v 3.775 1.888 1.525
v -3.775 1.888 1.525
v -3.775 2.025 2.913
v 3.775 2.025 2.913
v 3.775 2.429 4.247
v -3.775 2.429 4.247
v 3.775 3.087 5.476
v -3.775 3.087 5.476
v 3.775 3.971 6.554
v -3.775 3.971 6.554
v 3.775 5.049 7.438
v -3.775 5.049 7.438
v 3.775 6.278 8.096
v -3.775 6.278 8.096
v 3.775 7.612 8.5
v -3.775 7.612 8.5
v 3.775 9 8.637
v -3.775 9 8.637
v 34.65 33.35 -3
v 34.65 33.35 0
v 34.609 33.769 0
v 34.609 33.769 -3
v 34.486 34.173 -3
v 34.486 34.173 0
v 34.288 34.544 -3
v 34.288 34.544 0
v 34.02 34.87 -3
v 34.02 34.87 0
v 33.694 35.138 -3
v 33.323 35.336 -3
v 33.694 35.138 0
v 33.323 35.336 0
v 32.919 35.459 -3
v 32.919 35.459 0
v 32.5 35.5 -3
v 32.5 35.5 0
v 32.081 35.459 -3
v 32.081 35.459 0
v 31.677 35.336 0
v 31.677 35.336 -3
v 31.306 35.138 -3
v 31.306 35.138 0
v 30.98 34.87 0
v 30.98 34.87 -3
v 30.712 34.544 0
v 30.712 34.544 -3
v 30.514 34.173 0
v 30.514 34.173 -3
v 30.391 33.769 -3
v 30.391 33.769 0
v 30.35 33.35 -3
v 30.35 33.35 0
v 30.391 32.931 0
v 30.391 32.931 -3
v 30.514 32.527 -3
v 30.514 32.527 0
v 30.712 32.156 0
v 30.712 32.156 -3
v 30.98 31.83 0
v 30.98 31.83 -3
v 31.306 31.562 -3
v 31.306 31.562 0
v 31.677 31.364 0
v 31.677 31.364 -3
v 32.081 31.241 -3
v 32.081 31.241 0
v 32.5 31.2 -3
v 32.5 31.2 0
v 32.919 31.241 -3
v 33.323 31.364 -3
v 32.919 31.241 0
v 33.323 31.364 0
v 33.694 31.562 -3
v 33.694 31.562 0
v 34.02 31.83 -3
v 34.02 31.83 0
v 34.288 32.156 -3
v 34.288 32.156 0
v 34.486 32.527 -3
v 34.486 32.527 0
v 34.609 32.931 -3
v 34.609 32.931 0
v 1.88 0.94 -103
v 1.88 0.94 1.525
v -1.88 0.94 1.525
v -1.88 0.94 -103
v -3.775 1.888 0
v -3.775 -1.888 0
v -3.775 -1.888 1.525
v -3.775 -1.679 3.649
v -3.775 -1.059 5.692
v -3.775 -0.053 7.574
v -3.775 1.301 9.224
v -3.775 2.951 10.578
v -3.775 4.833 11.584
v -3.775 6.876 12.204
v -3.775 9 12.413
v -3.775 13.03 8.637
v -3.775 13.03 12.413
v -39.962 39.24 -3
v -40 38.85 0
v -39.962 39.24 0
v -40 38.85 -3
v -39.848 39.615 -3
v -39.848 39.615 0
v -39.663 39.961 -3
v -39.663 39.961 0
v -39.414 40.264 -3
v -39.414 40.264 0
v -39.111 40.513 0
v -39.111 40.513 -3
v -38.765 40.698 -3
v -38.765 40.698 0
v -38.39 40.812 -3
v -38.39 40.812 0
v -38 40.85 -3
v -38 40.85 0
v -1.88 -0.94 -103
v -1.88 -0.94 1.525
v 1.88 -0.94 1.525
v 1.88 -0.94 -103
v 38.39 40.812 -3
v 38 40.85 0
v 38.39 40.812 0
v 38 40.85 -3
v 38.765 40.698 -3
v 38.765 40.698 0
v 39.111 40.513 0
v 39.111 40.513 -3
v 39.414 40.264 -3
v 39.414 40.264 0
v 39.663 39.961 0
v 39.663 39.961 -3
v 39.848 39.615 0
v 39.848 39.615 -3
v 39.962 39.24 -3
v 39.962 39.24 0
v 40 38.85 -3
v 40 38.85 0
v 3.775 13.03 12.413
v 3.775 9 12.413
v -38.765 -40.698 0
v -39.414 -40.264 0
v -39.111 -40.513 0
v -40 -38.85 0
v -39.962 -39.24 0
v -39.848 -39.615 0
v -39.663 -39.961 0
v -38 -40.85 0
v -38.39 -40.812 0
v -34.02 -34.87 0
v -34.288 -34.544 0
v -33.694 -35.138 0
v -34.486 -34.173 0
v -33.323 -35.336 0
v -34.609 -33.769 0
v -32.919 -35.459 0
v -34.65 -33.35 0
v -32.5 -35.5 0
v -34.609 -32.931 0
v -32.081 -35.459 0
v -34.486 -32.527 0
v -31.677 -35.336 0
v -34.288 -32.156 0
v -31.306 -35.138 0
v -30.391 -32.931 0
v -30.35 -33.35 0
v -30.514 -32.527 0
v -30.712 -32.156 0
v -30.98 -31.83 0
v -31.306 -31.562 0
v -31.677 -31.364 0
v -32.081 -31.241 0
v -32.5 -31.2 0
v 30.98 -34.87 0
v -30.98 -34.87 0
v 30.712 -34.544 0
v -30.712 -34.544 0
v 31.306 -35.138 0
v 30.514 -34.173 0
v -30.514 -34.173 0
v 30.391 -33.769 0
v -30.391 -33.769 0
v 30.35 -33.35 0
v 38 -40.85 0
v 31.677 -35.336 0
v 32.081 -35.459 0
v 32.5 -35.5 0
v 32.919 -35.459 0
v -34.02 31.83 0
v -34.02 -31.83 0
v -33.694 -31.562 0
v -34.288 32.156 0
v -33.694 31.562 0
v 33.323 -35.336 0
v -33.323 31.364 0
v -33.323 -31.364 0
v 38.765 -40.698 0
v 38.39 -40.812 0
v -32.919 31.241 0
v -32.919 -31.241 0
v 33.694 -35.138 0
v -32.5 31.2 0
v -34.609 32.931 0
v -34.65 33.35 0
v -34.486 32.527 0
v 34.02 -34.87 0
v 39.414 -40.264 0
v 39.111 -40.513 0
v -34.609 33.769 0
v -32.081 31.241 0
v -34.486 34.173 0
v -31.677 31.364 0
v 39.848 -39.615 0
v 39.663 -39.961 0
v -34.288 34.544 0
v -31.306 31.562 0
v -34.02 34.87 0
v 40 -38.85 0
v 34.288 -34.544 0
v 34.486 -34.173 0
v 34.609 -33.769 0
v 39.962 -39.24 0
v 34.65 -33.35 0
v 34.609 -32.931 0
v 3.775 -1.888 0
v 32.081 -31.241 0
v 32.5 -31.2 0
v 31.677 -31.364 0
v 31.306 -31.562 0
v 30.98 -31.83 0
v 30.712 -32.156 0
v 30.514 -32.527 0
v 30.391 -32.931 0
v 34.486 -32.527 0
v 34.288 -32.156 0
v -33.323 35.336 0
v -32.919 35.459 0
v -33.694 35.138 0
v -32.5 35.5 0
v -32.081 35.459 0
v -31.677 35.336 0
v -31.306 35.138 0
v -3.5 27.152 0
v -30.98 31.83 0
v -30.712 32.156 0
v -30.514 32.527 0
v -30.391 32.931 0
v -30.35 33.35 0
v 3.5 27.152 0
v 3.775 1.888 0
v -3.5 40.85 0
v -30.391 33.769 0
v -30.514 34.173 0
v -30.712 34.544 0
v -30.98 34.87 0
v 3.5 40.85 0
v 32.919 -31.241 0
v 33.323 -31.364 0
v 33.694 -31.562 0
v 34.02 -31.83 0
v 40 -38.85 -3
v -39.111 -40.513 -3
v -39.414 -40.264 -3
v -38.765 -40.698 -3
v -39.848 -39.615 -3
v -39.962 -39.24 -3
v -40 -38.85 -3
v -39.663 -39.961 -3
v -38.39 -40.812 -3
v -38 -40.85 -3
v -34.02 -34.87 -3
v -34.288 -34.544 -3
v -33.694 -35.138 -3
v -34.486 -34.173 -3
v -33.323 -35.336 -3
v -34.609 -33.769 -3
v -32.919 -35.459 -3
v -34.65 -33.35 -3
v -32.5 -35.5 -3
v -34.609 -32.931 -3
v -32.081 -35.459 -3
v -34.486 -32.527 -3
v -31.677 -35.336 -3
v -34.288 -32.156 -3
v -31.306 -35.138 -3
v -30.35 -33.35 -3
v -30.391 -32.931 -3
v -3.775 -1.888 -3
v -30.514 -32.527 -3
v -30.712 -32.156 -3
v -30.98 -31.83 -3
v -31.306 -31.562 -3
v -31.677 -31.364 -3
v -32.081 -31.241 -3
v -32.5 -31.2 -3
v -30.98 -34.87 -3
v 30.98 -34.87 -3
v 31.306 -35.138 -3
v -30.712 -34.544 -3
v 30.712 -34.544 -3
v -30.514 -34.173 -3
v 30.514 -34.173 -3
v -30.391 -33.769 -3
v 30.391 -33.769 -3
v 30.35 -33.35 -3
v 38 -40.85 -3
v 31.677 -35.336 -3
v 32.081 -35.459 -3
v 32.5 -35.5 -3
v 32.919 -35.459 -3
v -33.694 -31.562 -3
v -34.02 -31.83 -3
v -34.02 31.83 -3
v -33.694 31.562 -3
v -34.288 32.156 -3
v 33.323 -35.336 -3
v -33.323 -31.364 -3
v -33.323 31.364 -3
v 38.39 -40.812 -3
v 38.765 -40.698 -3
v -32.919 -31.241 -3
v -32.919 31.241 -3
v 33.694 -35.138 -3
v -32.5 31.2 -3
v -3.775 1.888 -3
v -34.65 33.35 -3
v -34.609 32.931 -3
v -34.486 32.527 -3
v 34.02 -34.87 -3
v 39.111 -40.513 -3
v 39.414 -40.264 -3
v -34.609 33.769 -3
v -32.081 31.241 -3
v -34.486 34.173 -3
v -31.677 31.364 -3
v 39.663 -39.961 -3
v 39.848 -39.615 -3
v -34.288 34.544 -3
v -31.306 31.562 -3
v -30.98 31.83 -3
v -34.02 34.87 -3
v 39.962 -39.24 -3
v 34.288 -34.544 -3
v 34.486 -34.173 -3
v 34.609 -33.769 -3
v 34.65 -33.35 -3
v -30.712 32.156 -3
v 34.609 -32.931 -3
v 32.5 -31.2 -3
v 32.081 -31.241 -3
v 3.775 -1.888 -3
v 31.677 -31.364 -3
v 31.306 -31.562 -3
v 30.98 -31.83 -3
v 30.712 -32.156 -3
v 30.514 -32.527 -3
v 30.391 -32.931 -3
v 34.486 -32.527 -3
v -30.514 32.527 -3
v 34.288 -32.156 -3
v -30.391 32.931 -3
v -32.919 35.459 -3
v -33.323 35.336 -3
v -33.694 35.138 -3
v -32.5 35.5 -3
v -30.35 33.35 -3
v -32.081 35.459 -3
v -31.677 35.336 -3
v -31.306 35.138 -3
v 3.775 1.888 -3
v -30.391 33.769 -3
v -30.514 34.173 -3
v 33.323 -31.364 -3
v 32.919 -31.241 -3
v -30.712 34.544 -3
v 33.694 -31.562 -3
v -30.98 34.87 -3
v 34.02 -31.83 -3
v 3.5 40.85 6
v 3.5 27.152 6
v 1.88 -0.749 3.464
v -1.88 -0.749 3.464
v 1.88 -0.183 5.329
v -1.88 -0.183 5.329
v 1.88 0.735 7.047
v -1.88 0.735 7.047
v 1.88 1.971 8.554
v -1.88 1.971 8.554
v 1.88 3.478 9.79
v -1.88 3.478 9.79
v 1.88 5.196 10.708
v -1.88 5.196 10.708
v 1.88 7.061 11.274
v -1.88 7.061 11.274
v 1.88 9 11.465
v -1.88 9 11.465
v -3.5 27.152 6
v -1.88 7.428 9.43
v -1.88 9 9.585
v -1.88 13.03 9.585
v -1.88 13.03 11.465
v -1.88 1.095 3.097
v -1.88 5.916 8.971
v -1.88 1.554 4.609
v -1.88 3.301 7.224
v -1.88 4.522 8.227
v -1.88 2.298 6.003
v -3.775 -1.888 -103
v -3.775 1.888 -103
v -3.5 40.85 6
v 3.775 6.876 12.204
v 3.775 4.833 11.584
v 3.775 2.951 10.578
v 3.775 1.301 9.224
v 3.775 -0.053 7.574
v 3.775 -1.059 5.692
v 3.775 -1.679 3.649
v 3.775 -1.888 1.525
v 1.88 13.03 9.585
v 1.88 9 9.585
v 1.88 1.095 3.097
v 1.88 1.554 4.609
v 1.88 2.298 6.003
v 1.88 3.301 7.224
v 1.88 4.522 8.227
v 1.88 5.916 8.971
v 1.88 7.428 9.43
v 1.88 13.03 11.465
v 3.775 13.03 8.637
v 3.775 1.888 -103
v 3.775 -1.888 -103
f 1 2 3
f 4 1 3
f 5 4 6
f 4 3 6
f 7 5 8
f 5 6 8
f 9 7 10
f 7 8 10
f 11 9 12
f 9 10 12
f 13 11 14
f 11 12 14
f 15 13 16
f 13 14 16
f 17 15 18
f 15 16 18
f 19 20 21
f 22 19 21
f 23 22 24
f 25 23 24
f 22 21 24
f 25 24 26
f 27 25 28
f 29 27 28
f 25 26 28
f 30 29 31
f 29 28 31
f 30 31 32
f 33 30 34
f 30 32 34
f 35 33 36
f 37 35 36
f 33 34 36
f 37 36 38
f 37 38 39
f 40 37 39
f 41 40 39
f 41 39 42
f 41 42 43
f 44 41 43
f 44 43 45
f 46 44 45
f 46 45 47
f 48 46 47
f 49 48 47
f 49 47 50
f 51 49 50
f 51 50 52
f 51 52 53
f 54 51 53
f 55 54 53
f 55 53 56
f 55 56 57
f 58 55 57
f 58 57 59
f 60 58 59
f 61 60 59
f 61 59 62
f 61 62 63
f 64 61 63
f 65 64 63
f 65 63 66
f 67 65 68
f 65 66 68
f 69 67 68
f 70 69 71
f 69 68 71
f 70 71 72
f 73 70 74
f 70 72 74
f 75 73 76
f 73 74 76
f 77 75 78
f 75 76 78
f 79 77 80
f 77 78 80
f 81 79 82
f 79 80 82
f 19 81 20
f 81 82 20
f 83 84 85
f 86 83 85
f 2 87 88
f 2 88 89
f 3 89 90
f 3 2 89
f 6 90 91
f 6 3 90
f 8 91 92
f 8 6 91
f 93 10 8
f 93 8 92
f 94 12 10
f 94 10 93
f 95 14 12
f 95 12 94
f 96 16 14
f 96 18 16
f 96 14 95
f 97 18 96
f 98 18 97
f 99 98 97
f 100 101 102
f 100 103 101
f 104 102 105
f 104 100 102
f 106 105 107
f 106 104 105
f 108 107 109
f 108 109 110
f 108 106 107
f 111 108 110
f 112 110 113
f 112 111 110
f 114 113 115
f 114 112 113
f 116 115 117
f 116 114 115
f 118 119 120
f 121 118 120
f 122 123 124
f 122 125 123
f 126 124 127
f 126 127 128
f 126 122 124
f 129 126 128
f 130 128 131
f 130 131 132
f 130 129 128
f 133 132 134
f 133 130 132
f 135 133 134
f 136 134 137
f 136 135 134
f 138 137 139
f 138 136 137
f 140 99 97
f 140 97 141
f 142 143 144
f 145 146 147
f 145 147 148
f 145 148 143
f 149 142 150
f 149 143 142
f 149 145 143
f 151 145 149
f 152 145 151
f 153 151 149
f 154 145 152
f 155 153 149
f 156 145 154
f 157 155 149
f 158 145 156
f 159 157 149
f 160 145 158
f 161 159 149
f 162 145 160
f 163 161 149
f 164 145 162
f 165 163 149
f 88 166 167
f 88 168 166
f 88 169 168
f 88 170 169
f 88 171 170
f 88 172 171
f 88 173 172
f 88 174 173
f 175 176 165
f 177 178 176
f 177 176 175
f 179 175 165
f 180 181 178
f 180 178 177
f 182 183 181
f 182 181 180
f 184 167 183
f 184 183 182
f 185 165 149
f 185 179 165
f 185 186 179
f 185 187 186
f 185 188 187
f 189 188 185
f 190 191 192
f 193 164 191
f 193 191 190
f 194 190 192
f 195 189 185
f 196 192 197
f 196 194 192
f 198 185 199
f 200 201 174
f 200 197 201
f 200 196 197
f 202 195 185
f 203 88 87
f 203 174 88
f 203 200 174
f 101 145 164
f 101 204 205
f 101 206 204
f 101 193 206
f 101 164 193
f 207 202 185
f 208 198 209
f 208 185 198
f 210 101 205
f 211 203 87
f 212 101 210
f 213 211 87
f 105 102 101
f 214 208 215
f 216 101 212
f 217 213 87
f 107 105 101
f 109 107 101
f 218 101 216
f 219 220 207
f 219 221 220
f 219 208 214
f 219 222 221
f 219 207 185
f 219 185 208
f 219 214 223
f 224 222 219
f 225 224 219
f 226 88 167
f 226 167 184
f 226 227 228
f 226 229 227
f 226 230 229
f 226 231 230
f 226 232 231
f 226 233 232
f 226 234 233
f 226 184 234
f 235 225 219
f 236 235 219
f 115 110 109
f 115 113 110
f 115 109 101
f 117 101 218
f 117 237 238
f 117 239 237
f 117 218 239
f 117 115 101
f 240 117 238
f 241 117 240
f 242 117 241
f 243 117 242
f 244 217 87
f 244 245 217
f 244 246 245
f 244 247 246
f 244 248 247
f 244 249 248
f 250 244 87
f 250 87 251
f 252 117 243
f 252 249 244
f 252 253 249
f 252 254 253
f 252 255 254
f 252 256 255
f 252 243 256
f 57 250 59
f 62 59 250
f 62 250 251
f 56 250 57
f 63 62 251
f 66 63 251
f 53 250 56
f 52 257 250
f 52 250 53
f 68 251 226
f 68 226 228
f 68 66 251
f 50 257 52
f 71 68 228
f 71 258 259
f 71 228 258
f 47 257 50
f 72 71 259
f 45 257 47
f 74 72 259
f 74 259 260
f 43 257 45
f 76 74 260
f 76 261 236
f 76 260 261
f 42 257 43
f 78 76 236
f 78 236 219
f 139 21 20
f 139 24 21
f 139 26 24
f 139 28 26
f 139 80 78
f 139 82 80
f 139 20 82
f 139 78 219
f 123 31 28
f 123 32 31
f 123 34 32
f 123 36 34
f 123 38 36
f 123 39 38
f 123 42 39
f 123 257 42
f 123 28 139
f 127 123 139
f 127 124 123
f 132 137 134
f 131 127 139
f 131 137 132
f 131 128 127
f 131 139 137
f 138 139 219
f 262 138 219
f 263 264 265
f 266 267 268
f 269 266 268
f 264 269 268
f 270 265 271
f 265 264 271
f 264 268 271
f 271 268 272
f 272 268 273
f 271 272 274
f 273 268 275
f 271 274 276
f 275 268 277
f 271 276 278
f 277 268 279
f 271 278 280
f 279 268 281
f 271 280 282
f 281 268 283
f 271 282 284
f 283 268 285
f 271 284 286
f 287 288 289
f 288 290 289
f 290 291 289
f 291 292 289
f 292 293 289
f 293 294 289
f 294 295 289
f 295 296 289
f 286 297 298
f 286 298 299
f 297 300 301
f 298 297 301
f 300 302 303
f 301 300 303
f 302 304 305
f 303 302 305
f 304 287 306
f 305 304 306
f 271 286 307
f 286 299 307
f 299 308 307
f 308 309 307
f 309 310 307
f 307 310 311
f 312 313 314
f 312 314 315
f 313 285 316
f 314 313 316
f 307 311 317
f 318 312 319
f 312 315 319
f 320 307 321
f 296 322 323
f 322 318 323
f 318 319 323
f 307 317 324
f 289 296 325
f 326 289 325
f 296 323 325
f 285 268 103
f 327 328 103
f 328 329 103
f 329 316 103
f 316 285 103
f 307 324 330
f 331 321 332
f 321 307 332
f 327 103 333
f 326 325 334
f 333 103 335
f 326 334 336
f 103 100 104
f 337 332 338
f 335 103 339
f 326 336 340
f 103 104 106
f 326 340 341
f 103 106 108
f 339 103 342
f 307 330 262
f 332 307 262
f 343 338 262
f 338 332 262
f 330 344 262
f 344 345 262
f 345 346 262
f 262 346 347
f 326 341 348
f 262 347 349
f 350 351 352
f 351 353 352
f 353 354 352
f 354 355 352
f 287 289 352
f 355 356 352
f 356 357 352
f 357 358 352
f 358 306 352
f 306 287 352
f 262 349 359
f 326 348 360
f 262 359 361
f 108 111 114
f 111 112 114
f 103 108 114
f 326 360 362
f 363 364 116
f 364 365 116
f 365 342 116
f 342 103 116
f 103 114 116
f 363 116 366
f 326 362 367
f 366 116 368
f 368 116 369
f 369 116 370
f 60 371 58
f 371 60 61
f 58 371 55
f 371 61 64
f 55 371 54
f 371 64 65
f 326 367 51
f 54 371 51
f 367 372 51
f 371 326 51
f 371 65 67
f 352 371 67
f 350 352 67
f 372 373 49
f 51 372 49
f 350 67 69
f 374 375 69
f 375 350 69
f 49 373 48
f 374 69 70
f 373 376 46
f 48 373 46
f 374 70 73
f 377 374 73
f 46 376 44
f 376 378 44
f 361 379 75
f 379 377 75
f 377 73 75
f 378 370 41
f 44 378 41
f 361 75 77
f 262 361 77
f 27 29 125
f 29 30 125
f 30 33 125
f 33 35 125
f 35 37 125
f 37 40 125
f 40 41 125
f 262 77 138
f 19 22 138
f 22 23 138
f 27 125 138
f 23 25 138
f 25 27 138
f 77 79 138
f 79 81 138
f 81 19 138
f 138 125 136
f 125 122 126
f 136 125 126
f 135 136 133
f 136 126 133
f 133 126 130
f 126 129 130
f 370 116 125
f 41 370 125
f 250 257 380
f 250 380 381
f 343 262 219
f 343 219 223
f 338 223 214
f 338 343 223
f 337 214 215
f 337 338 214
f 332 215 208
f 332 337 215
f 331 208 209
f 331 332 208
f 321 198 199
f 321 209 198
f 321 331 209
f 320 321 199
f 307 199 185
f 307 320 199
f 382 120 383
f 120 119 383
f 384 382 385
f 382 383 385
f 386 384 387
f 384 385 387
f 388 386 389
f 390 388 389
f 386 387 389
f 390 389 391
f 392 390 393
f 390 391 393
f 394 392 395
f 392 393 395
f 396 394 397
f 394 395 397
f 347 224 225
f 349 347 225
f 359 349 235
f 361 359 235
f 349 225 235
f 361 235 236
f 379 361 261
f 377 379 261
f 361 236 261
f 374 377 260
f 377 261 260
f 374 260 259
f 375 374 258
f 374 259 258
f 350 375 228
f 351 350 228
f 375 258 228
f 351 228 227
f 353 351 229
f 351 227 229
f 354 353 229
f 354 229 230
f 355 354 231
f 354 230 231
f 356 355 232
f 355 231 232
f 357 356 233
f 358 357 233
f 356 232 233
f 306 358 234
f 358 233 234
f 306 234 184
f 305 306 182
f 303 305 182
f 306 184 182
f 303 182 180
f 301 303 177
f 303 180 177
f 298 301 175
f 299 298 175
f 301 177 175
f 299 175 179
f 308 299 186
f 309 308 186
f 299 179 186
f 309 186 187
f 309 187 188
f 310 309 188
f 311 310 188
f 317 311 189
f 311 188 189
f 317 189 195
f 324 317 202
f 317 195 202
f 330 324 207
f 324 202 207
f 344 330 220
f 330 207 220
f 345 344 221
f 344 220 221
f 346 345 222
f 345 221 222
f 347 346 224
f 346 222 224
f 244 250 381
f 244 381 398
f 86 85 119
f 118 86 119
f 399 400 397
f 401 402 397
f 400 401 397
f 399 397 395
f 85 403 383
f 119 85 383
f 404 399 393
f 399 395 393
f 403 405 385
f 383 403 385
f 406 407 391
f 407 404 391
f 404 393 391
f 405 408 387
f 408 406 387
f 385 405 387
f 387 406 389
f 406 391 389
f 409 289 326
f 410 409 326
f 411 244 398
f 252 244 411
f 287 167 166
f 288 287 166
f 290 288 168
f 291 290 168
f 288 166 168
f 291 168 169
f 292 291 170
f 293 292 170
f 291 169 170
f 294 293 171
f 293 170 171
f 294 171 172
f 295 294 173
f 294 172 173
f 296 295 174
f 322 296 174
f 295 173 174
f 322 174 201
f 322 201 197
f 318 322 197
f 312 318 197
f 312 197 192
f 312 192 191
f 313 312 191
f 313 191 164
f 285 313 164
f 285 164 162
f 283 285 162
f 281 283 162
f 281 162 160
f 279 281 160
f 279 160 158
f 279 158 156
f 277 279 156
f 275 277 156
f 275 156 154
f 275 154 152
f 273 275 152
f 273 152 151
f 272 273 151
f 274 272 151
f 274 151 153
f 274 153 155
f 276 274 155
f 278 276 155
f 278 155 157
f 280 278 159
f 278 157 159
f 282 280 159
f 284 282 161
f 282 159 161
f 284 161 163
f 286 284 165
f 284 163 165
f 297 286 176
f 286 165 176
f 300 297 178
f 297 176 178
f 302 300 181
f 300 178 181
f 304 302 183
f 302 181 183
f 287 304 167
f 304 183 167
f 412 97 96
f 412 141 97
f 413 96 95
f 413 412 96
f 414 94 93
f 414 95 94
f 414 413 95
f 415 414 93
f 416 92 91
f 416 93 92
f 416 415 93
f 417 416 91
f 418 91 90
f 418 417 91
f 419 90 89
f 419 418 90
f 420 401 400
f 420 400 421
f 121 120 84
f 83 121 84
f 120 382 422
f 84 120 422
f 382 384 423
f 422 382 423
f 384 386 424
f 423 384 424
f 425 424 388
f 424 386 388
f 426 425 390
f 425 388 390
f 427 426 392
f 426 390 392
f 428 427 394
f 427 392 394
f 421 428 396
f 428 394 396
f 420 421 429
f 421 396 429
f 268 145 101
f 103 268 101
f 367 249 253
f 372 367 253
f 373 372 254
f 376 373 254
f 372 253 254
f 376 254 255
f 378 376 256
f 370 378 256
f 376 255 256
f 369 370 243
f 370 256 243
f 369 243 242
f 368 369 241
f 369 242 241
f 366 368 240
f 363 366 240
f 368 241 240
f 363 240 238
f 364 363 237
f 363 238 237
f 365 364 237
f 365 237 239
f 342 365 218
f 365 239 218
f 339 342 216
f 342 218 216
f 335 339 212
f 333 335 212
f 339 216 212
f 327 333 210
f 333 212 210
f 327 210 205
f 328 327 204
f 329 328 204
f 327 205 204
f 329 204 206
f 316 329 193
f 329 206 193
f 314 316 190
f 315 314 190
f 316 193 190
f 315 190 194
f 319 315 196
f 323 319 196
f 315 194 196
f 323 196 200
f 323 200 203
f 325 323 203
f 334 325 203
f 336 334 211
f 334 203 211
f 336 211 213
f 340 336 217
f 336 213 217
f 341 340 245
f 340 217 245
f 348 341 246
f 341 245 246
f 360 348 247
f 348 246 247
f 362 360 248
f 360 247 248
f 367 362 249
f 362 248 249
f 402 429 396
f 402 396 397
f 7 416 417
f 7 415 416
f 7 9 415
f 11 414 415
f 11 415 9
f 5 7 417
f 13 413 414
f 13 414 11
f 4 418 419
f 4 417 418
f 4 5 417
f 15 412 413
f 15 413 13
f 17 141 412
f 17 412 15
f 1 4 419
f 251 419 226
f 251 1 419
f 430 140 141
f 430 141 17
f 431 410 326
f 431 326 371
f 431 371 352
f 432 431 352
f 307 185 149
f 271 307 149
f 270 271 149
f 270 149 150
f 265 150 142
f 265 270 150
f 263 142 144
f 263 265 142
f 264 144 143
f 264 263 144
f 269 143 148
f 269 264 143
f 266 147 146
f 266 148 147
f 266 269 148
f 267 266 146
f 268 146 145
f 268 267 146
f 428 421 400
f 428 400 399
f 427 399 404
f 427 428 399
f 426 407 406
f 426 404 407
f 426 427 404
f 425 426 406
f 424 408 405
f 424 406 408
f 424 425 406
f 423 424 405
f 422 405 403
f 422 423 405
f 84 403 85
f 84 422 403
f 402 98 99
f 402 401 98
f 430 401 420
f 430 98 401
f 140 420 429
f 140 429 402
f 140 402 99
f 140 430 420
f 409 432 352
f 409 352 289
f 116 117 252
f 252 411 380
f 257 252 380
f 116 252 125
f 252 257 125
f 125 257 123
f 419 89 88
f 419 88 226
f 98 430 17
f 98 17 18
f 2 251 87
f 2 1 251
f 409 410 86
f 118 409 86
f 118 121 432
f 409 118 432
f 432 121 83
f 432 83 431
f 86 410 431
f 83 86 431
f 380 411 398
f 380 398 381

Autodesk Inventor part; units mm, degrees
sketch "S-Basis" plane through (0, 0, 0) normal (0, 0, 1) x (1, 0, 0)
  line L0 (0, 57.19) -> (0, -57.19) construction
  line L1 (-56, 0) -> (56, 0) construction
  line L2 (1.8795, -0.94) -> (1.8795, 0.94)
  line L3 (1.8795, 0.94) -> (-1.8795, 0.94)
  line L4 (-1.8795, 0.94) -> (-1.8795, -0.94)
  line L5 (-1.8795, -0.94) -> (1.8795, -0.94)
  line L6 (1.8795, -0.94) -> (-1.8795, 0.94) construction
  line L7 (1.8795, 0.94) -> (-1.8795, -0.94) construction
  line L8 (-40, 40.85) -> (40, 40.85)
  line L9 (40, 40.85) -> (40, -40.85)
  line L10 (40, -40.85) -> (-40, -40.85)
  line L11 (-40, -40.85) -> (-40, 40.85)
  line L12 (-40, 40.85) -> (40, -40.85) construction
  line L13 (40, 40.85) -> (-40, -40.85) construction
  line L14 (-40, 33.35) -> (40, 33.35) construction
  circle A0 centre (0, 33.35) radius 2.5 construction
  line L15 (-40, 13.03) -> (40, 13.03) construction
  line L16 (-3.7747, 1.8879) -> (3.7747, 1.8879)
  line L17 (3.7747, 1.8879) -> (3.7747, -1.8879)
  line L18 (3.7747, -1.8879) -> (-3.7747, -1.8879)
  line L19 (-3.7747, -1.8879) -> (-3.7747, 1.8879)
  line L20 (-3.7747, 1.8879) -> (3.7747, -1.8879) construction
  line L21 (3.7747, 1.8879) -> (-3.7747, -1.8879) construction
  circle A1 centre (-32.5, 33.35) radius 2.15
  circle A2 centre (32.5, 33.35) radius 2.15
  circle A3 centre (-32.5, -33.35) radius 2.15
  circle A4 centre (32.5, -33.35) radius 2.15
  line L22 (-3.5, 40.85) -> (3.5, 40.85)
  line L23 (3.5, 40.85) -> (3.5, 27.1517)
  line L24 (3.5, 27.1517) -> (-3.5, 27.1517)
  line L25 (-3.5, 27.1517) -> (-3.5, 40.85)
  point P0 (0, 0)
  point P1 (0, 40.85)
  dimension "d0" = 81.7
  dimension "d1" = 80
  dimension "d2" = 3.759
  dimension "d3" = 1.88
  dimension "d4" = 7.5
  dimension "d5" = 5
  dimension "d6" = 20.32
  dimension "d7" = 4.3
  dimension "d8" = 32.5
  dimension "d9" = 4.3
  dimension "d10" = 32.5
  dimension "d11" = 7.5
  dimension "d23" = 7
ref_plane "Anschlussebene-Übergang" through (-40, 13.03, 0) normal (0, 1, 0) x (1, 0, 0)
extrude "Ex-Base1" add sketch "S-Basis" against normal blind 3 contours L8 L25 L24 L23 L9 L10 L11 | L8 L23 L24 L25 | L16 L17 L18 L19
extrude "Ex-Probe" add sketch "S-Basis" against normal blind 103 contours L16 L17 L18 L19
sketch "Skizze2" plane through (0, 0, 0) normal (1, 0, 0) x (0, 1, 0)
  line L0 (13.03, 14.8668) -> (13.03, -2.4778) projected
  line L1 (0, 14.8668) -> (0, -2.4778) projected
  line L2 (-4.8428, 0) -> (16.0088, 0) projected
  line L3 (13.03, 10.525) -> (9, 10.525)
  line L4 (0, 0) -> (0, 1.525)
  arc A0 (9, 10.525) -> (0, 1.525) centre (9, 1.525) ccw
  dimension "d18" = 10.525
  dimension "d19" = 9
sweep "Sweep-Anschluss" add profiles "S-Basis" path "Skizze2" path curves L4 A0 L3 contours L16 L17 L18 L19
fillet "Rundung1" radius 2 4 edges at (40, -40.85, -1.5) (-40, -40.85, -1.5) (40, 40.85, -1.5) (-40, 40.85, -1.5)
ref_plane "RWG-X" through (1.8795, 9, 10.525) normal (0, 0, -1) x (-1, 0, 0)
ref_plane "RWG-Y" through (0, 9, 9.585) normal (1, 0, 0) x (0, 0, -1)
extrude "Extrusion3" add sketch "S-Basis" along normal blind 6 contours L8 L23 L24 L25
equation "\"d10\" = d8"
equation "\"d11\" = d4"
properties part number "ProbeAntennaDummy"
